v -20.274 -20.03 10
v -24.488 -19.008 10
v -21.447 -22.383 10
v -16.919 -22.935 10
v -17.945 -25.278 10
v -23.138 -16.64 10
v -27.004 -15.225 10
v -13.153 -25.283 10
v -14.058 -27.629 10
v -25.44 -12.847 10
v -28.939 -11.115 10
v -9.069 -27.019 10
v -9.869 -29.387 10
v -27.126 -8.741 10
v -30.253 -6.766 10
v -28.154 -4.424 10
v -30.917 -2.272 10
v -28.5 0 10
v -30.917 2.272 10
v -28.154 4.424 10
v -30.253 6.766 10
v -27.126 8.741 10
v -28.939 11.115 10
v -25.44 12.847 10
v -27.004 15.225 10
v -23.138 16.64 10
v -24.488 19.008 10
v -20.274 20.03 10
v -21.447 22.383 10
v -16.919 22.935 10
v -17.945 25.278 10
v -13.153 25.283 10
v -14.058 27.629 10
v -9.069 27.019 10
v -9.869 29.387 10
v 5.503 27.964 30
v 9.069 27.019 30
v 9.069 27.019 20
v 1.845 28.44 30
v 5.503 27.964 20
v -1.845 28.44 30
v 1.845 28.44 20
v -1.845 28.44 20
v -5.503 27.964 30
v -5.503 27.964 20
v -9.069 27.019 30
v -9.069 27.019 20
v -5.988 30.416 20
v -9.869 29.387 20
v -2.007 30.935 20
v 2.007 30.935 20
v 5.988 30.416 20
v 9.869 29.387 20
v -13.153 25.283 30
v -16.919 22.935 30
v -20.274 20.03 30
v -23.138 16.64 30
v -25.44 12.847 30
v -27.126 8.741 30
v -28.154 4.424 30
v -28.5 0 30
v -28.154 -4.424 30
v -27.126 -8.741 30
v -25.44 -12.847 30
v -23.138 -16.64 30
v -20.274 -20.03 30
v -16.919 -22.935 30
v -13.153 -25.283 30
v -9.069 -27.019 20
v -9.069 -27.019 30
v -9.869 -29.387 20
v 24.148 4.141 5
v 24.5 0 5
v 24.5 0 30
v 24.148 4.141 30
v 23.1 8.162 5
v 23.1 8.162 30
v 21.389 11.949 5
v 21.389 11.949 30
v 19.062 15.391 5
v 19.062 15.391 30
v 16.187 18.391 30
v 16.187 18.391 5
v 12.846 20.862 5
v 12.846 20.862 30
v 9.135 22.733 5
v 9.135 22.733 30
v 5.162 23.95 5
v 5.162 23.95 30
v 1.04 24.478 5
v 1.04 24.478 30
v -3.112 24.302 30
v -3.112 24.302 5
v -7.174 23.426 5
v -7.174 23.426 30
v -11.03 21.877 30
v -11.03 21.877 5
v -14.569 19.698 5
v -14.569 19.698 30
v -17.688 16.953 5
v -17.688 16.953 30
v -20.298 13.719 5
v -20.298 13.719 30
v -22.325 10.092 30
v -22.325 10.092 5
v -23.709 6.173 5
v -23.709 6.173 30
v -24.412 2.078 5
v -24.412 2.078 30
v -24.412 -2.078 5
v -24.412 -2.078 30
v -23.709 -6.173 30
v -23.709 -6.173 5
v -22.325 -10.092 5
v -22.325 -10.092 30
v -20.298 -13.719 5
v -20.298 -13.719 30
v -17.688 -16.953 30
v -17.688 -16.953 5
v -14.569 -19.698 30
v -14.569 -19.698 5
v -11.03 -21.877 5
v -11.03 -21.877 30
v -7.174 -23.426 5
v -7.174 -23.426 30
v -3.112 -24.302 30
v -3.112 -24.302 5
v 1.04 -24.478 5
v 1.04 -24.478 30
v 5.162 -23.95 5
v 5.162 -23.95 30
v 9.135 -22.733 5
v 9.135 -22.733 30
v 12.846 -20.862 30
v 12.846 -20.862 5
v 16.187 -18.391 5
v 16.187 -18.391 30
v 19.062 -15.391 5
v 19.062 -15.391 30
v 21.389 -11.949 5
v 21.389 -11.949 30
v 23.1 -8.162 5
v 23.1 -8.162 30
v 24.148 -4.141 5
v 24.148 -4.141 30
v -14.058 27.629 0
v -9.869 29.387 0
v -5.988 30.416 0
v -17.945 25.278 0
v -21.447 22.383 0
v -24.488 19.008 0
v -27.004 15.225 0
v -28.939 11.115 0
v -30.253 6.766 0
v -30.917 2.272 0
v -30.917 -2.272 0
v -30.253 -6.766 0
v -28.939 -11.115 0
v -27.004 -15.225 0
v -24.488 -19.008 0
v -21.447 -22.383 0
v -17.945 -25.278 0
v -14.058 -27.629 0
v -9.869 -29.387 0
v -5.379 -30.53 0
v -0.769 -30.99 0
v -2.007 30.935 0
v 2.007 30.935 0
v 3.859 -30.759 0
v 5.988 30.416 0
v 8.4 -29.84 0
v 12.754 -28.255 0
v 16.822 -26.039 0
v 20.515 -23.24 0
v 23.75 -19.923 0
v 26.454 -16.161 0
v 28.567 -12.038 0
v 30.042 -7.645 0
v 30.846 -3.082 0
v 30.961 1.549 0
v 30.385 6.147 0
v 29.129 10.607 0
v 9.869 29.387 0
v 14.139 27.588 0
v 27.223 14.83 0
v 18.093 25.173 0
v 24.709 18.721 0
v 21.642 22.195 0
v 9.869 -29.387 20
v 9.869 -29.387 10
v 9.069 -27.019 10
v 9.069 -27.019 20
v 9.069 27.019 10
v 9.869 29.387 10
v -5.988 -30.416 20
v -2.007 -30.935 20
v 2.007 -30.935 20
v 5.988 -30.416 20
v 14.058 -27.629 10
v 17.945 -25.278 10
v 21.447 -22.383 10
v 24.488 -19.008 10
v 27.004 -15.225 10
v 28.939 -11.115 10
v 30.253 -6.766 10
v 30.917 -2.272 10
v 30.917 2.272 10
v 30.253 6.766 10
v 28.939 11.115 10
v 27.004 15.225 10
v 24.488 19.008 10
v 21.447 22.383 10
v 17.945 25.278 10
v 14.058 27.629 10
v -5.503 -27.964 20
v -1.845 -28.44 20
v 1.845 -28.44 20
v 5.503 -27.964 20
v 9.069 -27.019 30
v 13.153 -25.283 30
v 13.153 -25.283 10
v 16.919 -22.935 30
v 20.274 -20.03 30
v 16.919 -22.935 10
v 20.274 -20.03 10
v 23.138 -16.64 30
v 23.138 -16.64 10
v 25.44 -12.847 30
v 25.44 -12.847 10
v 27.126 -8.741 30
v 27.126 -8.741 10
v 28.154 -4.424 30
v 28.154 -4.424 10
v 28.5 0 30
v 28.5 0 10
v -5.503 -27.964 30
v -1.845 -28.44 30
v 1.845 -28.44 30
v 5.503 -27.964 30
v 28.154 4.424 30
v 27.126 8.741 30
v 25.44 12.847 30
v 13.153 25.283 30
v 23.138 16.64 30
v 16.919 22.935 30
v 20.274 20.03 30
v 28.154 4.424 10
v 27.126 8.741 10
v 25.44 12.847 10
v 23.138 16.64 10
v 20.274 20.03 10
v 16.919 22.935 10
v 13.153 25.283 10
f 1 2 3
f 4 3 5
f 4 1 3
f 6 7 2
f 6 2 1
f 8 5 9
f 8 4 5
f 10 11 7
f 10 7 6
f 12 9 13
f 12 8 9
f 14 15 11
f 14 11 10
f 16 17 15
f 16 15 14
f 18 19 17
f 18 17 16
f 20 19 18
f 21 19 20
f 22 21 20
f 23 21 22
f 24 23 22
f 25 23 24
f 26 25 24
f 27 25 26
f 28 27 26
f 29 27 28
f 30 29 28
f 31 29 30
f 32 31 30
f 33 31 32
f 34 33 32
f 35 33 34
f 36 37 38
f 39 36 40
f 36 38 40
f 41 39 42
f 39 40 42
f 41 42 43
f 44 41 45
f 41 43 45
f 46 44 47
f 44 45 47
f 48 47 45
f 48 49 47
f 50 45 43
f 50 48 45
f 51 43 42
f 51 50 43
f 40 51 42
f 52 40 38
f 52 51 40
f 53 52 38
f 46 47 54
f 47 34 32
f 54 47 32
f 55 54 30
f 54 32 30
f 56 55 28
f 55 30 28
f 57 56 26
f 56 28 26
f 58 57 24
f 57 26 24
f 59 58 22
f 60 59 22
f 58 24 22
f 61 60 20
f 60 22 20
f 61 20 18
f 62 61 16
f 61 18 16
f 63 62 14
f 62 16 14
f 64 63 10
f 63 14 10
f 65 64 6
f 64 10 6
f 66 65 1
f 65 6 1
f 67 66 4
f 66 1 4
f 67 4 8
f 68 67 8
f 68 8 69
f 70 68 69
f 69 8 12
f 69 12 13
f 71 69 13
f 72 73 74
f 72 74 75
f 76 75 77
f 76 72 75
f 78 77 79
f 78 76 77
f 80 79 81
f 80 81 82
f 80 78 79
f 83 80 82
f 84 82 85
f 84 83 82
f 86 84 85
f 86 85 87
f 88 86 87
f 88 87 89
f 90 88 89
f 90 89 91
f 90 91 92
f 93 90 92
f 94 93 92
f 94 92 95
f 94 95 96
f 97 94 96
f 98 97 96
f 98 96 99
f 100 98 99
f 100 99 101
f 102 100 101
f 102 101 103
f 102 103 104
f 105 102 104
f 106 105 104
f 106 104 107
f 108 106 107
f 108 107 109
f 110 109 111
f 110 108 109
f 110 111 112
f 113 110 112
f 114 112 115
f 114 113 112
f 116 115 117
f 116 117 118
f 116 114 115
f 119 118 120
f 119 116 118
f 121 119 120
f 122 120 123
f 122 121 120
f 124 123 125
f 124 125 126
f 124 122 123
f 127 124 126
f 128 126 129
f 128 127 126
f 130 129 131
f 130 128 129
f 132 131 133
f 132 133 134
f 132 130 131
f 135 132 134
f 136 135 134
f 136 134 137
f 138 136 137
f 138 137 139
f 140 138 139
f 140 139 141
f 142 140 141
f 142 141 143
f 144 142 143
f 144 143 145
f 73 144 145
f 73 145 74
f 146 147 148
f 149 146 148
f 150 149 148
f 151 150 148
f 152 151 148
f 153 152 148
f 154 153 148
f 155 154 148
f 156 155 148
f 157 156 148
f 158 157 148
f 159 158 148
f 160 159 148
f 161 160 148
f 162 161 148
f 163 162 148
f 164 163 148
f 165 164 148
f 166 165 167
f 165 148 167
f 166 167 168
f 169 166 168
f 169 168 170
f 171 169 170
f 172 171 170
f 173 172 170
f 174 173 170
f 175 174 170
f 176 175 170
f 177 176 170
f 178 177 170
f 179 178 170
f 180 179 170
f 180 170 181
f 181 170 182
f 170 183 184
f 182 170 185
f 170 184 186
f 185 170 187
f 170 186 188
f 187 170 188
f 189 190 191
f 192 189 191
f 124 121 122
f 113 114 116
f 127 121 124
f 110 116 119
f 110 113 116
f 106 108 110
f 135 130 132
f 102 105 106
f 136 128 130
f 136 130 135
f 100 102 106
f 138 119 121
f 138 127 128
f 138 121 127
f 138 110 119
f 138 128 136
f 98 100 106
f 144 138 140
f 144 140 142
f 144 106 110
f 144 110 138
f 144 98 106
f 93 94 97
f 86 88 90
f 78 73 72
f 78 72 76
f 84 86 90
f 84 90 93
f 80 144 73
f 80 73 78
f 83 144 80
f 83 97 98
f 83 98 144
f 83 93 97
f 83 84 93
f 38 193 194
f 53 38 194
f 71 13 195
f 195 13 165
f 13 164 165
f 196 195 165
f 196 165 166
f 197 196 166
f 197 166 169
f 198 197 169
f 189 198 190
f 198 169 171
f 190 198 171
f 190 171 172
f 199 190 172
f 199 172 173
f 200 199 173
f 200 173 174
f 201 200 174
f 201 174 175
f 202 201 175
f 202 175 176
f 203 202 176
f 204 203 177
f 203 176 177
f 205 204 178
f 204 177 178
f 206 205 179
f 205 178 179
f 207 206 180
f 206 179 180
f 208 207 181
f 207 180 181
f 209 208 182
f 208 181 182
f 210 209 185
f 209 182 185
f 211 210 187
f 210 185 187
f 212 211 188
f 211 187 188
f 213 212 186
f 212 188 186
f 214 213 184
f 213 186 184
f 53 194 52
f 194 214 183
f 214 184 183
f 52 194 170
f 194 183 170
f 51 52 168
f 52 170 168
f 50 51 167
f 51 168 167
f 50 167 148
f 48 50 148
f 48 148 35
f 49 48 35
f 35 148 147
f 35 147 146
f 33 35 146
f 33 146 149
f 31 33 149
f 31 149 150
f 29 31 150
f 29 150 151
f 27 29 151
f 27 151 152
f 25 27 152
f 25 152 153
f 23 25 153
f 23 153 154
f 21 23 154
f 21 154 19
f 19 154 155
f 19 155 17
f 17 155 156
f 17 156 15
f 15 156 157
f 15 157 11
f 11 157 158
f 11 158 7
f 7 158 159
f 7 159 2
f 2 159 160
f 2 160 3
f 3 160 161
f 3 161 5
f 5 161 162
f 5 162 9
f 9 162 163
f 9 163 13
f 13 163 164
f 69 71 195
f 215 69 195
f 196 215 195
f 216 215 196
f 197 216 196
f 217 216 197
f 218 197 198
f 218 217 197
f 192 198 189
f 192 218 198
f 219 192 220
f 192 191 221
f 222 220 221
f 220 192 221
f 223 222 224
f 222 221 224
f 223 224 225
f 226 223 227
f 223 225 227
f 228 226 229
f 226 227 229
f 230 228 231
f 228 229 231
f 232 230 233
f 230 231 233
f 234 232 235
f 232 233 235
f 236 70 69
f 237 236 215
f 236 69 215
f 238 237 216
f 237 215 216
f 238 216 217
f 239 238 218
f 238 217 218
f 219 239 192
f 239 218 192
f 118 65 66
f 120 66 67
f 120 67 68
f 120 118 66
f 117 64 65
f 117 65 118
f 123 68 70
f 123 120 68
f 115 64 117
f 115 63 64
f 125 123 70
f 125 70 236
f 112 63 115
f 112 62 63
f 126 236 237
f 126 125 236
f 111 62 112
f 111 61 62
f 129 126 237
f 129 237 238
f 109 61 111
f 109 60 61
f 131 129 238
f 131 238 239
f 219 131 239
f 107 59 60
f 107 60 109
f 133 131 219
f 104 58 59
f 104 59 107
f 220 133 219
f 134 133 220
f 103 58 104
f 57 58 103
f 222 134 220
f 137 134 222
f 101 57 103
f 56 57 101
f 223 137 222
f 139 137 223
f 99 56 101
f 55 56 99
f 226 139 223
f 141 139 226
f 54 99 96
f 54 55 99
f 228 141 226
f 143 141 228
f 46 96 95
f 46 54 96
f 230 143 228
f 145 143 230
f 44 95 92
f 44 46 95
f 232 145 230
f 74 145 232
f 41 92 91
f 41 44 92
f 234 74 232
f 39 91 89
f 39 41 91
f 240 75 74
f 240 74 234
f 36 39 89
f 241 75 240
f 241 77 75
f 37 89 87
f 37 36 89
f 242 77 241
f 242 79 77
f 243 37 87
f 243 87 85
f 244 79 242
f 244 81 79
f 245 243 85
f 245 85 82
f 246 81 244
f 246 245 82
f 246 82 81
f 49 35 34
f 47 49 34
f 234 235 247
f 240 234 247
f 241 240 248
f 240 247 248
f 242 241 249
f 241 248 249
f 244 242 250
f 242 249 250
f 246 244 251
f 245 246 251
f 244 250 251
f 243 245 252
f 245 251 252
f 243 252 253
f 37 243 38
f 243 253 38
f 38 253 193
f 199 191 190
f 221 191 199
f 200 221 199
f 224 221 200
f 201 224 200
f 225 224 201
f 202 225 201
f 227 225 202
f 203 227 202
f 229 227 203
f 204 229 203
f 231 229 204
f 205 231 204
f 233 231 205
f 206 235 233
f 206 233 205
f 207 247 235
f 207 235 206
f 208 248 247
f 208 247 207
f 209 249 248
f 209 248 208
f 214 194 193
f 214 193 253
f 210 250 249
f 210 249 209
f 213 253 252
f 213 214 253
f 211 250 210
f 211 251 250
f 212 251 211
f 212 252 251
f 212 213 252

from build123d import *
from build123d import SkipClean  # not in build123d's __all__

# Parameters (mm, degrees)
F1_DEPTH = 10
F0_R     = 24.5
F2_DEPTH = 30
F3_DEPTH = 20
F4_DEPTH = 20
F5_DEPTH = 30
F6_DEPTH = 5


with BuildPart() as f1:
    # F0 (on Top) → F1 (new body)
    with BuildSketch(Plane.XY):
        with BuildLine():
            ThreePointArc((-9.06851449, 27.018735073), (0, 28.5), (9.06851449, 27.018735073))
            Line((9.06851449, 27.018735073), (9.8690700263, 29.3870967742))
            ThreePointArc((9.8690700263, 29.3870967742), (0, 31), (-9.8690700263, 29.3870967742))
            Line((-9.8690700263, 29.3870967742), (-9.06851449, 27.018735073))
        make_face()
        with BuildLine():
            ThreePointArc((-9.06851449, -27.018735073), (-28.5, 0), (-9.06851449, 27.018735073))
            Line((-9.06851449, 27.018735073), (-9.8690700263, 29.3870967742))
            ThreePointArc((-9.8690700263, 29.3870967742), (-31, 0), (-9.8690700263, -29.3870967742))
            Line((-9.8690700263, -29.3870967742), (-9.06851449, -27.018735073))
        make_face()
        with BuildLine():
            Line((9.8690700263, -29.3870967742), (9.06851449, -27.018735073))
            ThreePointArc((9.06851449, -27.018735073), (0, -28.5), (-9.06851449, -27.018735073))
            Line((-9.06851449, -27.018735073), (-9.8690700263, -29.3870967742))
            ThreePointArc((-9.8690700263, -29.3870967742), (0, -31), (9.8690700263, -29.3870967742))
        make_face()
        with BuildLine():
            ThreePointArc((9.06851449, 27.018735073), (23.1376604583, 16.6402724893), (28.5, 0))
            ThreePointArc((28.5, 0), (23.1376604583, -16.6402724893), (9.06851449, -27.018735073))
            Line((9.06851449, -27.018735073), (9.8690700263, -29.3870967742))
            ThreePointArc((9.8690700263, -29.3870967742), (25.1688415587, -18.0977737469), (31, 0))
            ThreePointArc((31, 0), (25.1688415587, 18.0977737469), (9.8690700263, 29.3870967742))
            Line((9.8690700263, 29.3870967742), (9.06851449, 27.018735073))
        make_face()
    extrude(amount=F1_DEPTH)

    # F0 (on Top) → F2 (cut)
    with BuildSketch(Plane.XY):
        with BuildLine():
            ThreePointArc((9.06851449, -27.018735073), (23.1376604583, -16.6402724893), (28.5, 0))
            ThreePointArc((28.5, 0), (23.1376604583, 16.6402724893), (9.06851449, 27.018735073))
            ThreePointArc((9.06851449, 27.018735073), (0, 28.5), (-9.06851449, 27.018735073))
            ThreePointArc((-9.06851449, 27.018735073), (-28.5, 0), (-9.06851449, -27.018735073))
            ThreePointArc((-9.06851449, -27.018735073), (0, -28.5), (9.06851449, -27.018735073))
        make_face()
        Circle(F0_R, mode=Mode.SUBTRACT)
    extrude(amount=F2_DEPTH, mode=Mode.SUBTRACT)

    # F0 (on Top) → F3 (join)
    with BuildSketch(Plane.XY):
        with BuildLine():
            ThreePointArc((-9.06851449, 27.018735073), (0, 28.5), (9.06851449, 27.018735073))
            Line((9.06851449, 27.018735073), (9.8690700263, 29.3870967742))
            ThreePointArc((9.8690700263, 29.3870967742), (0, 31), (-9.8690700263, 29.3870967742))
            Line((-9.8690700263, 29.3870967742), (-9.06851449, 27.018735073))
        make_face()
    with SkipClean():  # cleaning this boolean's faces spoils the solid; the shape is the same uncleaned
        extrude(amount=F3_DEPTH)

    # F0 (on Top) → F4 (join)
    with BuildSketch(Plane.XY):
        with BuildLine():
            Line((9.8690700263, -29.3870967742), (9.06851449, -27.018735073))
            ThreePointArc((9.06851449, -27.018735073), (0, -28.5), (-9.06851449, -27.018735073))
            Line((-9.06851449, -27.018735073), (-9.8690700263, -29.3870967742))
            ThreePointArc((-9.8690700263, -29.3870967742), (0, -31), (9.8690700263, -29.3870967742))
        make_face()
    with SkipClean():  # cleaning this boolean's faces spoils the solid; the shape is the same uncleaned
        extrude(amount=F4_DEPTH)

    # F0 (on Top) → F5 (join)
    with BuildSketch(Plane.XY):
        with BuildLine():
            ThreePointArc((9.06851449, -27.018735073), (23.1376604583, -16.6402724893), (28.5, 0))
            ThreePointArc((28.5, 0), (23.1376604583, 16.6402724893), (9.06851449, 27.018735073))
            ThreePointArc((9.06851449, 27.018735073), (0, 28.5), (-9.06851449, 27.018735073))
            ThreePointArc((-9.06851449, 27.018735073), (-28.5, 0), (-9.06851449, -27.018735073))
            ThreePointArc((-9.06851449, -27.018735073), (0, -28.5), (9.06851449, -27.018735073))
        make_face()
        Circle(F0_R, mode=Mode.SUBTRACT)
    extrude(amount=F5_DEPTH)

    # F0 (on Top) → F6 (join)
    with BuildSketch(Plane.XY):
        Circle(F0_R)
    extrude(amount=F6_DEPTH)


solid = f1.part
